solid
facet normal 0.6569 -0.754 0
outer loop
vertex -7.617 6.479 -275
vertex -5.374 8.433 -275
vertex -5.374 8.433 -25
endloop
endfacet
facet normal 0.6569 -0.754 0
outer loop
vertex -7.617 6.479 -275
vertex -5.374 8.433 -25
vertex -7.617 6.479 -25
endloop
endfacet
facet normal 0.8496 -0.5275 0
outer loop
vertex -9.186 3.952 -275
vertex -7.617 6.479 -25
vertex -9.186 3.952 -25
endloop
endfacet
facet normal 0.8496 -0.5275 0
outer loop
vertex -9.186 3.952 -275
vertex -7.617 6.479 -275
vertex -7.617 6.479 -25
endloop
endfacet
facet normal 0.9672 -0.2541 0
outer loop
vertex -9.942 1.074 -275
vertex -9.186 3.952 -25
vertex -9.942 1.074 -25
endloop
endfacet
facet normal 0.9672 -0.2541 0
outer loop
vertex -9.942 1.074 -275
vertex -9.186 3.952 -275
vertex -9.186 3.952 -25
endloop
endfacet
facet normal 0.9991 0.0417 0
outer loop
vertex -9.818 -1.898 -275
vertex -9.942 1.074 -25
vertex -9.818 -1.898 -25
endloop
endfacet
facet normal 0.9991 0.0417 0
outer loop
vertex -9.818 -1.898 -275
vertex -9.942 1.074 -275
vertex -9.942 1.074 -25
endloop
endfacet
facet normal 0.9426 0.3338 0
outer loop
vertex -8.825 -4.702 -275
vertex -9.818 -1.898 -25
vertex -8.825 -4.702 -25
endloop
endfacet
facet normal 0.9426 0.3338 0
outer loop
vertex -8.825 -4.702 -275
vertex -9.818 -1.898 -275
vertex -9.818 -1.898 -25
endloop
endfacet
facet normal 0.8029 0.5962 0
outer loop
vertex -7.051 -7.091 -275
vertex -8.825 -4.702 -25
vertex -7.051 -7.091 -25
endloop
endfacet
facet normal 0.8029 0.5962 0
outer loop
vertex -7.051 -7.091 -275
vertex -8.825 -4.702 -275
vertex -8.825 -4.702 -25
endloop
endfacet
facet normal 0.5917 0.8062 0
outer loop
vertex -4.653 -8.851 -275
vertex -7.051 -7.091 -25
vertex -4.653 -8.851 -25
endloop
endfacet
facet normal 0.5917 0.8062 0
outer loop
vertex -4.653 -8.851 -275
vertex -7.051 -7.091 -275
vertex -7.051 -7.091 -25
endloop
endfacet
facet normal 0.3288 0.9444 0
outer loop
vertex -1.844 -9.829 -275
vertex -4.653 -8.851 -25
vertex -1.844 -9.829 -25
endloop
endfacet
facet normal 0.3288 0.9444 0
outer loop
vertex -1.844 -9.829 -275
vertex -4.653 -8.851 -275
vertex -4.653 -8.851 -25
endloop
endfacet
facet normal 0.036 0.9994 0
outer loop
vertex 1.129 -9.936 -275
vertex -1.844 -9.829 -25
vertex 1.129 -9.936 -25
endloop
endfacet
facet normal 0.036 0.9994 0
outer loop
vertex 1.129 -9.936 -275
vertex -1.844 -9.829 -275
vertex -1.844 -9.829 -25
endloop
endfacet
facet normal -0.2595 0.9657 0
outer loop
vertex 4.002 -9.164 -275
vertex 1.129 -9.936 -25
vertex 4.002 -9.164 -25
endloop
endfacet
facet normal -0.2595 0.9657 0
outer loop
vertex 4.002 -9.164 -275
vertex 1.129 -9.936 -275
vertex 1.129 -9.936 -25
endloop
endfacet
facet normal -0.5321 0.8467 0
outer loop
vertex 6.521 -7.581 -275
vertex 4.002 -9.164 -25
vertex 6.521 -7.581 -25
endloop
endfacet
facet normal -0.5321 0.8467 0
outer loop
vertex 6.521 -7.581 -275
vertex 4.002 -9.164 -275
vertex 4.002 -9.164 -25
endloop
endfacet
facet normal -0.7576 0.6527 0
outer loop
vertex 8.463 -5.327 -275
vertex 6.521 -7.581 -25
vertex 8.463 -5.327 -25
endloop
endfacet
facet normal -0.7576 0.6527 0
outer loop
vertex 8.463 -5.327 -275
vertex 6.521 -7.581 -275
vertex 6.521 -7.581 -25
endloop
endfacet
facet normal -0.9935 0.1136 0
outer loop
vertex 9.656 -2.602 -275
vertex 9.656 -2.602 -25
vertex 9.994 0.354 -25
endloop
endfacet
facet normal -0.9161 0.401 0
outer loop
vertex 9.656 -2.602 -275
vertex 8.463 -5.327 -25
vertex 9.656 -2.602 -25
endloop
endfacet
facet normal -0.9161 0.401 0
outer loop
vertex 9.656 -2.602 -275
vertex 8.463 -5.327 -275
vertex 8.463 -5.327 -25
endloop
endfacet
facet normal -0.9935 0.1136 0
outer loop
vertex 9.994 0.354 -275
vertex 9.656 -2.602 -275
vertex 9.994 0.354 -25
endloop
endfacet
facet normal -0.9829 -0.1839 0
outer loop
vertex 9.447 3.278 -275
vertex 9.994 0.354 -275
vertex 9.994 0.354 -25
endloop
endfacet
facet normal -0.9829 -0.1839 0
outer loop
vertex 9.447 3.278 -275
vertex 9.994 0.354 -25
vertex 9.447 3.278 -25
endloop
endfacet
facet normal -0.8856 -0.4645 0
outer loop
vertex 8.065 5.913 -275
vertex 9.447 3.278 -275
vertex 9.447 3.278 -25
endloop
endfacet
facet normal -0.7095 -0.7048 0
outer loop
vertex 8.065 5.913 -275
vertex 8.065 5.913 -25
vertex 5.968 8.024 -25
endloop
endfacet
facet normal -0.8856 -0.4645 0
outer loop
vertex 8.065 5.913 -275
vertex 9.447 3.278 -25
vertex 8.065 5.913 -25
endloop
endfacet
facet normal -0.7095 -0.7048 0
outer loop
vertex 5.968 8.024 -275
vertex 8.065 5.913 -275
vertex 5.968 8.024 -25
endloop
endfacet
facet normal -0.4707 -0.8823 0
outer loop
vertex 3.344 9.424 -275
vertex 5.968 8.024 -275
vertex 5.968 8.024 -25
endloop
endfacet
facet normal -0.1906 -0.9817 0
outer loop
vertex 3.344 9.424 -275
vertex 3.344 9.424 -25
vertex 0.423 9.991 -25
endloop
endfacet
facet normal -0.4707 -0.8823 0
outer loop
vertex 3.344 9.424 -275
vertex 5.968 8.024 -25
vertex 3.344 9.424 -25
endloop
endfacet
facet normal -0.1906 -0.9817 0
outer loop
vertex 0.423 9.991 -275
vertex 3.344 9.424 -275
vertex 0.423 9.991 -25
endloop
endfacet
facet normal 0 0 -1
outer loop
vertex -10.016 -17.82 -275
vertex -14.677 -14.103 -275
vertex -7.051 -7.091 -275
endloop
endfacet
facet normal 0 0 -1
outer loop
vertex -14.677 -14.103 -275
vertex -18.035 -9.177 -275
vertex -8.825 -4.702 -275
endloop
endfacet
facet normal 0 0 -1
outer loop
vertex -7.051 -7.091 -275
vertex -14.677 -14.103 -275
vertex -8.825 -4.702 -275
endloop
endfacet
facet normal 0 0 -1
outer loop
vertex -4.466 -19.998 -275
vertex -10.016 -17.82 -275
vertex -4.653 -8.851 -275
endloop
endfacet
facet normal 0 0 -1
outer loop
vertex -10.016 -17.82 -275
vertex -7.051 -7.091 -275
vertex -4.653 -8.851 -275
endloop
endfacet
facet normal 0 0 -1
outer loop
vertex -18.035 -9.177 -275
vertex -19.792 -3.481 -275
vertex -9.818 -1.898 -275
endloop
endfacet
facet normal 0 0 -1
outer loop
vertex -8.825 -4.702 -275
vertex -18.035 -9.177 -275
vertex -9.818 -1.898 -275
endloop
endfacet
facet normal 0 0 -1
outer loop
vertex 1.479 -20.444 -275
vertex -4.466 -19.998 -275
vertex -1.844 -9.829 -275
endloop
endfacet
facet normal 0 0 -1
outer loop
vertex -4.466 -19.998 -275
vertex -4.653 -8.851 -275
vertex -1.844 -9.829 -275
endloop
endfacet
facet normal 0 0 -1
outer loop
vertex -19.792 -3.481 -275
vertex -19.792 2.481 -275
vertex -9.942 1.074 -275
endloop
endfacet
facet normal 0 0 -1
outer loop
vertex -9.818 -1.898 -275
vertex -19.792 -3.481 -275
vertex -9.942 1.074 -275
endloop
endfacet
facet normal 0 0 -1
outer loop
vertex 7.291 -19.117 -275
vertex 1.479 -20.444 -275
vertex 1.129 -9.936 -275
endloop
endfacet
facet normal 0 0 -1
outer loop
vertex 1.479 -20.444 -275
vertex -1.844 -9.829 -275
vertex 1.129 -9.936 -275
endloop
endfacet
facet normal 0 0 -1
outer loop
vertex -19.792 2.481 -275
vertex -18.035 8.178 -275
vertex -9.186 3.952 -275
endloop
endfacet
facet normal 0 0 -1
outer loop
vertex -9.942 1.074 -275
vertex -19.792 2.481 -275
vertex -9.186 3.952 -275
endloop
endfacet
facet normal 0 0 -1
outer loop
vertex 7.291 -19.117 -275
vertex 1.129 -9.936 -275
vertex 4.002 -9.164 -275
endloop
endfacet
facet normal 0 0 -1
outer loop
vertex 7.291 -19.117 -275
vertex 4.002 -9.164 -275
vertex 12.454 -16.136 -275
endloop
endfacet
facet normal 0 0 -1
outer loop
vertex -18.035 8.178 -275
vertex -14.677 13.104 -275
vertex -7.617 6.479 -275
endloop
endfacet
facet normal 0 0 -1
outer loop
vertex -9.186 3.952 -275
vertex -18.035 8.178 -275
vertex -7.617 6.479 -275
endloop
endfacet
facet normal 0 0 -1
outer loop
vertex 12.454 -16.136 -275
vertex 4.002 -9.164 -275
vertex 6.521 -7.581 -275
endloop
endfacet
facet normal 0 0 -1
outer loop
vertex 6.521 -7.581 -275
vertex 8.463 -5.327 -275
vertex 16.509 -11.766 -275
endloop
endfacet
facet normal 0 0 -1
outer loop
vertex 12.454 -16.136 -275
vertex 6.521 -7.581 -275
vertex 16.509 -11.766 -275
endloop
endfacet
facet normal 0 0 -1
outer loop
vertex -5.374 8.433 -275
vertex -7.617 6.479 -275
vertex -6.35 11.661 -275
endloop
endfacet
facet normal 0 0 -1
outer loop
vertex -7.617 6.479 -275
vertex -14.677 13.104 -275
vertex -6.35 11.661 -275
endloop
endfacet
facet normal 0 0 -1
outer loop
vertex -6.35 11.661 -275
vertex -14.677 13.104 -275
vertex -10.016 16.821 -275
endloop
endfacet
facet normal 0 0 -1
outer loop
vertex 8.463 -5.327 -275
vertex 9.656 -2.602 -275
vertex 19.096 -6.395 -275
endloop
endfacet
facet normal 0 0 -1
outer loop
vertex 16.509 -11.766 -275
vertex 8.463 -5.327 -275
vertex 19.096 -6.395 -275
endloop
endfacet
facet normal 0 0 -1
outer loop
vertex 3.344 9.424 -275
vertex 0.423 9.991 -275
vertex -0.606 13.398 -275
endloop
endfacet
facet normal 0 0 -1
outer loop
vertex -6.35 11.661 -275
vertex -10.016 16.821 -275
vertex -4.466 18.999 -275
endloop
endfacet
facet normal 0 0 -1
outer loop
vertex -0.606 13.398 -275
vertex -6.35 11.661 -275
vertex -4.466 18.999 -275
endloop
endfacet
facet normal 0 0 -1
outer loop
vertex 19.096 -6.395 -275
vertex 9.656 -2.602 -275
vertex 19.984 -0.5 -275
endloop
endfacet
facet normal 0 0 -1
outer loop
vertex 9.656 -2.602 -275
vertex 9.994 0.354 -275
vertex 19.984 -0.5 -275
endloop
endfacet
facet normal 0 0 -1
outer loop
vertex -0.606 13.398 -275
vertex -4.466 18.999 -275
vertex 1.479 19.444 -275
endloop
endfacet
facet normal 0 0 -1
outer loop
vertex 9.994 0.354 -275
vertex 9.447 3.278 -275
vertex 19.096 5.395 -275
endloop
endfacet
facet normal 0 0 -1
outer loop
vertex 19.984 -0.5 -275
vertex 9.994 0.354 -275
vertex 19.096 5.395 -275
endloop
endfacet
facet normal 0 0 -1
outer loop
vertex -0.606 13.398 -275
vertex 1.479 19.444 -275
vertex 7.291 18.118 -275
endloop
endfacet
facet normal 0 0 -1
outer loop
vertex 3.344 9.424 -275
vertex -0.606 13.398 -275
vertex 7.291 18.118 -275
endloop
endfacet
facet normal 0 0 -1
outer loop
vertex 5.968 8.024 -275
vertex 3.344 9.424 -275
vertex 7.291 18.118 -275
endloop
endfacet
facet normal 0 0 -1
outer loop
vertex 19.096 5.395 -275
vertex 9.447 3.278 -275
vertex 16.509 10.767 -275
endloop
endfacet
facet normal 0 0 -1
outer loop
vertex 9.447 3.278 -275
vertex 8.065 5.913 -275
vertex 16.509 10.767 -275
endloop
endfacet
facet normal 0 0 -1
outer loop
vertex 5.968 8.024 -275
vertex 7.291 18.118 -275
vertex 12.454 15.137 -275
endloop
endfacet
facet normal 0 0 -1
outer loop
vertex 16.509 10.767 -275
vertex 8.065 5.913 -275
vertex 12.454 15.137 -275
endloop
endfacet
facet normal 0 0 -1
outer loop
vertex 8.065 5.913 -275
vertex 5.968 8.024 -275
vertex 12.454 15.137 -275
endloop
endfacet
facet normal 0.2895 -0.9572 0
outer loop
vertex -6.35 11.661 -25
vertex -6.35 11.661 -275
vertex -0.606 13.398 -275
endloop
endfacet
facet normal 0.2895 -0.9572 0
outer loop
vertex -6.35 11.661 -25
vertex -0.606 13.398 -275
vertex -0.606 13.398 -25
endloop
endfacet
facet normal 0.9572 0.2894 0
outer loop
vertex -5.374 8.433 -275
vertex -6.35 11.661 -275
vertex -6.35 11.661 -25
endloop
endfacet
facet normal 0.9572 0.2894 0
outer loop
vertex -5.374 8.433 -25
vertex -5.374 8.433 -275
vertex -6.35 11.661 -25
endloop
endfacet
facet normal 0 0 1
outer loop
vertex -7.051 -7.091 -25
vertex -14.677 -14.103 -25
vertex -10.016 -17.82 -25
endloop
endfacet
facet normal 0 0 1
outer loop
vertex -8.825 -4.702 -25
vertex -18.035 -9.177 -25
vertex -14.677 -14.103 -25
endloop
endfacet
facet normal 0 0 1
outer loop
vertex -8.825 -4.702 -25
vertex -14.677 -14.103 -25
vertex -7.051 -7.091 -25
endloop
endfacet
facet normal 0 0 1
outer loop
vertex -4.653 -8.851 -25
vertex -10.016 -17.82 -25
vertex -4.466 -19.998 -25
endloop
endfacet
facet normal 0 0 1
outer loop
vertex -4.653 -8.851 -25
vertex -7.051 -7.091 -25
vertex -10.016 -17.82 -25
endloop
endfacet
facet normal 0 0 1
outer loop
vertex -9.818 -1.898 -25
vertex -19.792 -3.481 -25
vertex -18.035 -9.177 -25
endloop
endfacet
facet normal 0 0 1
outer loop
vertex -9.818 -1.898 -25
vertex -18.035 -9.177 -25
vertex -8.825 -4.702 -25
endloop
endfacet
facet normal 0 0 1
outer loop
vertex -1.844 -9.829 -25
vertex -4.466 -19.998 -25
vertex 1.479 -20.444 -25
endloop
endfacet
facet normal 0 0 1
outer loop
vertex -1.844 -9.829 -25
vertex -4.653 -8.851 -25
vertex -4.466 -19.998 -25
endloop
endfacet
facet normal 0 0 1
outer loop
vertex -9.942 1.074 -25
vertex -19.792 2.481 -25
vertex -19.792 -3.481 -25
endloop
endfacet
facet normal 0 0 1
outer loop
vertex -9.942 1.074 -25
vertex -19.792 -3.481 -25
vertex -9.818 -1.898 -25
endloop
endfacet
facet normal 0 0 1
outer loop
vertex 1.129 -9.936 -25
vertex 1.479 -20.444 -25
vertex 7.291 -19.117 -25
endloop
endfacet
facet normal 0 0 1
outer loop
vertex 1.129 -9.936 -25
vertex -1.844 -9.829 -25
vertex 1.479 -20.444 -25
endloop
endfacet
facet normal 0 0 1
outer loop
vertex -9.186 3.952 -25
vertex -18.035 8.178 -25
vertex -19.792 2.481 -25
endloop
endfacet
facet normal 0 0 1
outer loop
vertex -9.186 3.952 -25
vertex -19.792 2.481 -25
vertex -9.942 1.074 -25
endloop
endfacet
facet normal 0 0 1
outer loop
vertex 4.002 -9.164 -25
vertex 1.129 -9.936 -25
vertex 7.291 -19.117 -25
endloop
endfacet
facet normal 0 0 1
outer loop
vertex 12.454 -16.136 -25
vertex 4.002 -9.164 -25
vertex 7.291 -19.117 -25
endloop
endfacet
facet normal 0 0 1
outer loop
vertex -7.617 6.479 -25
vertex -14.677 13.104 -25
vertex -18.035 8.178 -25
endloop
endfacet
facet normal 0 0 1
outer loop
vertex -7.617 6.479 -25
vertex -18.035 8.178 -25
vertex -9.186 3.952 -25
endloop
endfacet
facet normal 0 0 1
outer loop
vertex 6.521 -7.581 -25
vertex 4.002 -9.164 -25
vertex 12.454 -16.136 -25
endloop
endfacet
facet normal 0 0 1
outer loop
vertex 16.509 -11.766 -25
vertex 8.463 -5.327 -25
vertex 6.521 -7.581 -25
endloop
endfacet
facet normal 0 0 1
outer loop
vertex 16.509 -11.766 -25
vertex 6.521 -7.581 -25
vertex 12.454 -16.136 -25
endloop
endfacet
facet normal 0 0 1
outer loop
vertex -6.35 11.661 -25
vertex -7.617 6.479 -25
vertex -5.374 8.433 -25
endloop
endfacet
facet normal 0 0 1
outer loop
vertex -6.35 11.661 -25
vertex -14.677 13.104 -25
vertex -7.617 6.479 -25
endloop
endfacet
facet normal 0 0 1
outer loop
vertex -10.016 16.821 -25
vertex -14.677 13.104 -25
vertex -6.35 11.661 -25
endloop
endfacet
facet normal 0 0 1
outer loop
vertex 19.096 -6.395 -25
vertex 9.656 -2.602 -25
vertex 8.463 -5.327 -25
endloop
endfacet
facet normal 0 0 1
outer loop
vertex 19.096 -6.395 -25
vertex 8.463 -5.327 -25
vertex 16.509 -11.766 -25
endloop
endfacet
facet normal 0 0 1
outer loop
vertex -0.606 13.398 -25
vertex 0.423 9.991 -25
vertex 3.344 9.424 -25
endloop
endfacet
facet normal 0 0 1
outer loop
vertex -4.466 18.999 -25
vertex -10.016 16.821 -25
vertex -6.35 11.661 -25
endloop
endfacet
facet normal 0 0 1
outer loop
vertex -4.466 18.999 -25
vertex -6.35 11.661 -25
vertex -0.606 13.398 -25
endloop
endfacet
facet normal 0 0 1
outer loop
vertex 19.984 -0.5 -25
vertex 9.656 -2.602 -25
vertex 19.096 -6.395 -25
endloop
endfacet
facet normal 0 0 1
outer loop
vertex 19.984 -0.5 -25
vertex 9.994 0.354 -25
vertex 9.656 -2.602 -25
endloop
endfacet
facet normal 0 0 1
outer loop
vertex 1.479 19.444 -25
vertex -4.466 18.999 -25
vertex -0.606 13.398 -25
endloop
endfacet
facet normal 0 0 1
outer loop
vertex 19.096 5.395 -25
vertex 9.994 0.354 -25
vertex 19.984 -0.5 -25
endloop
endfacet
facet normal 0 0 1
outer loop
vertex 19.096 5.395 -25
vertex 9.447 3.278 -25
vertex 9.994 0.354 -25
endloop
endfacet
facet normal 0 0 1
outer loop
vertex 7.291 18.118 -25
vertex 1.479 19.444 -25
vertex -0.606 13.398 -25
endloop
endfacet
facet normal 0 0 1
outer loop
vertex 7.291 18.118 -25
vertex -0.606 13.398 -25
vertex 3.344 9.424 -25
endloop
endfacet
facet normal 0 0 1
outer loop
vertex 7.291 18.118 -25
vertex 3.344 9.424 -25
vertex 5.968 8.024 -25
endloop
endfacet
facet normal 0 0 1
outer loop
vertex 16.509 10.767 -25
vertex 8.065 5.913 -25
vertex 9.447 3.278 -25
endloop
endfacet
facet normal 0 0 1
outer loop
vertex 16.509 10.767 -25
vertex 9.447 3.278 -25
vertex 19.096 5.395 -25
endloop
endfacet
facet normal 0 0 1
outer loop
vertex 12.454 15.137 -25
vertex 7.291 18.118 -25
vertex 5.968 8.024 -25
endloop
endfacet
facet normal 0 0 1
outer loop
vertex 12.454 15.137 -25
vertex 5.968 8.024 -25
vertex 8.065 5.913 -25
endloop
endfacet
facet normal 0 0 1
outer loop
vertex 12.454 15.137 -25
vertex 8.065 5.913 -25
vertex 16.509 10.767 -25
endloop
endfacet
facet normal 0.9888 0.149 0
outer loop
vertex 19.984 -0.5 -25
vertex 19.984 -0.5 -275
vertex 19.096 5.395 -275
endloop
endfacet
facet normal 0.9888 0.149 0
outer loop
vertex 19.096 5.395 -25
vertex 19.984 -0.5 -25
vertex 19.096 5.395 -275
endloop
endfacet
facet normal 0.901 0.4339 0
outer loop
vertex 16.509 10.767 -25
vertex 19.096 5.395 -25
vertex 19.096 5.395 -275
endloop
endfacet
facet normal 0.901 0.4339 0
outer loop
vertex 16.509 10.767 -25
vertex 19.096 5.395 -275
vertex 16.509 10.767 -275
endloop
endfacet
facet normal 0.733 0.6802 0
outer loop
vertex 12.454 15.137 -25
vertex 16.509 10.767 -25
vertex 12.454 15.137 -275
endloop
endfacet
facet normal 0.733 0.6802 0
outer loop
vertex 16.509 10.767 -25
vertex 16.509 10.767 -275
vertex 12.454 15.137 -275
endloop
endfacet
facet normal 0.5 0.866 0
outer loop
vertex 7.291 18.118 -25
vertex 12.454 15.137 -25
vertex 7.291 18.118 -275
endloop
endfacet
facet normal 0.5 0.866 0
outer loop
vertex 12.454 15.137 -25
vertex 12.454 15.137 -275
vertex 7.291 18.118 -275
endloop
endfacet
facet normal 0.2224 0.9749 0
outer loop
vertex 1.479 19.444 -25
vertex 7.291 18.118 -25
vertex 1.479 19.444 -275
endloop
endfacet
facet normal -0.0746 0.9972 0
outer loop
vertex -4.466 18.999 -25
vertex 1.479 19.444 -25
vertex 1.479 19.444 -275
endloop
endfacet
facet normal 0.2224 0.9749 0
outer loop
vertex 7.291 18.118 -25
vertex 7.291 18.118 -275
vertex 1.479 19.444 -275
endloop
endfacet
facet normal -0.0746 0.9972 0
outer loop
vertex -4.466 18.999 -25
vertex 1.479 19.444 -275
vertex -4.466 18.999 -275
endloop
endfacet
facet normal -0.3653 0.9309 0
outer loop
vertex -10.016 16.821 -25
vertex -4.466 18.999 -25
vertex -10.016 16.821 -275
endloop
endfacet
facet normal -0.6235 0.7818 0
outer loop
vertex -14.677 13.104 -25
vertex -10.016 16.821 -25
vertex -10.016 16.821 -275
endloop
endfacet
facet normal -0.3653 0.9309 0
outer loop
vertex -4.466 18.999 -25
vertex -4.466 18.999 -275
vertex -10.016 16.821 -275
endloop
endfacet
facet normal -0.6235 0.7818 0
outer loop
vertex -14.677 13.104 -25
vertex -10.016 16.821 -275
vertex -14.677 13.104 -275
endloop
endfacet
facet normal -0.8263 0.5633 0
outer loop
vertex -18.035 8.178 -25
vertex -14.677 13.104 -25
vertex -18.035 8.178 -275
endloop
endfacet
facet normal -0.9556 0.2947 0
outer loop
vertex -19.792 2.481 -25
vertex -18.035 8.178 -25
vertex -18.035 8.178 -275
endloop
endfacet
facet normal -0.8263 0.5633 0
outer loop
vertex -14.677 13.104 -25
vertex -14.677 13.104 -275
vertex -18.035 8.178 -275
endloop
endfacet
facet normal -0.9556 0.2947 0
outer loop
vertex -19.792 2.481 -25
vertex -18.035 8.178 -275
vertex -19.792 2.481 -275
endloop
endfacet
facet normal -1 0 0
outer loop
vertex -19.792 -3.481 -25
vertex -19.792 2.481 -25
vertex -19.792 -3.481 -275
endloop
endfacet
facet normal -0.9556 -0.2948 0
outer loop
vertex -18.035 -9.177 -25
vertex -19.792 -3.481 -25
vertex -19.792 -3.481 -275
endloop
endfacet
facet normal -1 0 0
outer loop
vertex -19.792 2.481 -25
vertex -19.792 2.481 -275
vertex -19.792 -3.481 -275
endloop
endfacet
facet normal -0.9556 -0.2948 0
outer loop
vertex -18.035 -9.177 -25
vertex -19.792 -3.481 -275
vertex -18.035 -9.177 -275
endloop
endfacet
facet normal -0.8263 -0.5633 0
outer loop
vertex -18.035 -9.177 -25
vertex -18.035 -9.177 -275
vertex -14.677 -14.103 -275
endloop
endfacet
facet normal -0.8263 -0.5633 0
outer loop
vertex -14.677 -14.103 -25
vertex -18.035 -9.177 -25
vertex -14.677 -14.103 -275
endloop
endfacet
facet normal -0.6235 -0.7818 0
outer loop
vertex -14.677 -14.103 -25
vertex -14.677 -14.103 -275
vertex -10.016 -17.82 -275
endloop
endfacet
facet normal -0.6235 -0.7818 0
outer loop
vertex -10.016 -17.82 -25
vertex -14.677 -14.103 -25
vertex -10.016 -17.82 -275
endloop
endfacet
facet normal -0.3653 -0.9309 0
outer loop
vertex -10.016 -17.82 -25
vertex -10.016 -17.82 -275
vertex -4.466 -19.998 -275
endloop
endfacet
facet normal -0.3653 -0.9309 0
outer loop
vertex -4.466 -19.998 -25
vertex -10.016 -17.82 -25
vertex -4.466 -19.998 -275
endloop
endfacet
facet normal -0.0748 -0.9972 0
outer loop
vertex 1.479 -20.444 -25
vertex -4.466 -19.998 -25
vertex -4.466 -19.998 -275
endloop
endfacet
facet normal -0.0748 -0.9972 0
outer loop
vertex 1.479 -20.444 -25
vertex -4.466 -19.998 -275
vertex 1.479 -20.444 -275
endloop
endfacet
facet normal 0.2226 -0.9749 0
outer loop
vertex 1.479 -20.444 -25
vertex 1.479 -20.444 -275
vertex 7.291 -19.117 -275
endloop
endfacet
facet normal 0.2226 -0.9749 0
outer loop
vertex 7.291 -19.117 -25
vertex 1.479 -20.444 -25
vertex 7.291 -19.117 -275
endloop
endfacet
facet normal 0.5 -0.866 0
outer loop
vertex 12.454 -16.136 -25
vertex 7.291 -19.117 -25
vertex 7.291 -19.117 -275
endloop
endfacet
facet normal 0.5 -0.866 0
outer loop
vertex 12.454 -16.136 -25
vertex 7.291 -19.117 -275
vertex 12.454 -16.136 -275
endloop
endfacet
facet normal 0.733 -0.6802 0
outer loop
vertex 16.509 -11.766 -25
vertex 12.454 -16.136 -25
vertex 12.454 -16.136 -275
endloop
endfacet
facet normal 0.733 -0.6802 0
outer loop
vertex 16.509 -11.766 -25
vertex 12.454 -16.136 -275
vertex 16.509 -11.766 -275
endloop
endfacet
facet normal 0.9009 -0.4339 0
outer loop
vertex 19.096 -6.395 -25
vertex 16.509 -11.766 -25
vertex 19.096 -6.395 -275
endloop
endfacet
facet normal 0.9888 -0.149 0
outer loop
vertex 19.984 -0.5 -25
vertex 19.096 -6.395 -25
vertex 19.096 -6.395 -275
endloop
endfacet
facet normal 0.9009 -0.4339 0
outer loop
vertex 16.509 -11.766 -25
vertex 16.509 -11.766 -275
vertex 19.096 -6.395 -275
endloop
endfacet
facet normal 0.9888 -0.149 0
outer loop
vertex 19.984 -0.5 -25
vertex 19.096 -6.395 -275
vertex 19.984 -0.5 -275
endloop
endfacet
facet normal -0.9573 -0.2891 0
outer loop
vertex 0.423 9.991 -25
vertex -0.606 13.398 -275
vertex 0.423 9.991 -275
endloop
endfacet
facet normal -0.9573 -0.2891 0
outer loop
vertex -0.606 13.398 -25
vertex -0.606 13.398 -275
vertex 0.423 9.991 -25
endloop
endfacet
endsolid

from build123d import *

# Parameters (mm, degrees)
EXTRUDE_START            = -275
SKETCH_1_R               = 20
SKETCH_1_R_2             = 10
EXTRUDE_1_DEPTH          = 250
CUT_EXTRUDE_1_REACH      = 282.584
CUT_EXTRUDE_1_END_RADIUS = 10
CUT_EXTRUDE_START        = -3
SKETCH_2_W               = 250
SKETCH_2_H               = 6


with BuildPart() as part:
    # 草圖1 → 填料-伸長1 (new body)
    with BuildSketch(Plane.XY.offset(EXTRUDE_START)):
        with Locations((-0.015741253, -0.499752152)):
            Circle(SKETCH_1_R)
        Circle(SKETCH_1_R_2, mode=Mode.SUBTRACT)
    extrude(amount=EXTRUDE_1_DEPTH)

    # 除料-伸長1: up to this cylinder (the profile starts outside it)
    cut_extrude_1_end = Plane(origin=(0, 0, -150), z_dir=(0, 0, 1)) * Cylinder(CUT_EXTRUDE_1_END_RADIUS, 586.168, mode=Mode.PRIVATE)
    # 草圖2 → 除料-伸長1 (cut, up to the surface)
    with BuildSketch(Plane(origin=(-2.893904806, 9.572111312, 0), x_dir=(0, 0, 1), z_dir=(0.28939048064098244, -0.9572111312110727, 0)).offset(CUT_EXTRUDE_START), mode=Mode.PRIVATE) as cut_extrude_1_sk1:
        with Locations((-150, -0.296650626)):
            Rectangle(SKETCH_2_W, SKETCH_2_H)
    cut_extrude_1_tool1 = extrude(cut_extrude_1_sk1.sketch, amount=CUT_EXTRUDE_1_REACH, mode=Mode.PRIVATE) - cut_extrude_1_end
    add(cut_extrude_1_tool1.solids().sort_by_distance((-3.478119, 12.529593, -150))[0], mode=Mode.SUBTRACT)


solid = part.part
